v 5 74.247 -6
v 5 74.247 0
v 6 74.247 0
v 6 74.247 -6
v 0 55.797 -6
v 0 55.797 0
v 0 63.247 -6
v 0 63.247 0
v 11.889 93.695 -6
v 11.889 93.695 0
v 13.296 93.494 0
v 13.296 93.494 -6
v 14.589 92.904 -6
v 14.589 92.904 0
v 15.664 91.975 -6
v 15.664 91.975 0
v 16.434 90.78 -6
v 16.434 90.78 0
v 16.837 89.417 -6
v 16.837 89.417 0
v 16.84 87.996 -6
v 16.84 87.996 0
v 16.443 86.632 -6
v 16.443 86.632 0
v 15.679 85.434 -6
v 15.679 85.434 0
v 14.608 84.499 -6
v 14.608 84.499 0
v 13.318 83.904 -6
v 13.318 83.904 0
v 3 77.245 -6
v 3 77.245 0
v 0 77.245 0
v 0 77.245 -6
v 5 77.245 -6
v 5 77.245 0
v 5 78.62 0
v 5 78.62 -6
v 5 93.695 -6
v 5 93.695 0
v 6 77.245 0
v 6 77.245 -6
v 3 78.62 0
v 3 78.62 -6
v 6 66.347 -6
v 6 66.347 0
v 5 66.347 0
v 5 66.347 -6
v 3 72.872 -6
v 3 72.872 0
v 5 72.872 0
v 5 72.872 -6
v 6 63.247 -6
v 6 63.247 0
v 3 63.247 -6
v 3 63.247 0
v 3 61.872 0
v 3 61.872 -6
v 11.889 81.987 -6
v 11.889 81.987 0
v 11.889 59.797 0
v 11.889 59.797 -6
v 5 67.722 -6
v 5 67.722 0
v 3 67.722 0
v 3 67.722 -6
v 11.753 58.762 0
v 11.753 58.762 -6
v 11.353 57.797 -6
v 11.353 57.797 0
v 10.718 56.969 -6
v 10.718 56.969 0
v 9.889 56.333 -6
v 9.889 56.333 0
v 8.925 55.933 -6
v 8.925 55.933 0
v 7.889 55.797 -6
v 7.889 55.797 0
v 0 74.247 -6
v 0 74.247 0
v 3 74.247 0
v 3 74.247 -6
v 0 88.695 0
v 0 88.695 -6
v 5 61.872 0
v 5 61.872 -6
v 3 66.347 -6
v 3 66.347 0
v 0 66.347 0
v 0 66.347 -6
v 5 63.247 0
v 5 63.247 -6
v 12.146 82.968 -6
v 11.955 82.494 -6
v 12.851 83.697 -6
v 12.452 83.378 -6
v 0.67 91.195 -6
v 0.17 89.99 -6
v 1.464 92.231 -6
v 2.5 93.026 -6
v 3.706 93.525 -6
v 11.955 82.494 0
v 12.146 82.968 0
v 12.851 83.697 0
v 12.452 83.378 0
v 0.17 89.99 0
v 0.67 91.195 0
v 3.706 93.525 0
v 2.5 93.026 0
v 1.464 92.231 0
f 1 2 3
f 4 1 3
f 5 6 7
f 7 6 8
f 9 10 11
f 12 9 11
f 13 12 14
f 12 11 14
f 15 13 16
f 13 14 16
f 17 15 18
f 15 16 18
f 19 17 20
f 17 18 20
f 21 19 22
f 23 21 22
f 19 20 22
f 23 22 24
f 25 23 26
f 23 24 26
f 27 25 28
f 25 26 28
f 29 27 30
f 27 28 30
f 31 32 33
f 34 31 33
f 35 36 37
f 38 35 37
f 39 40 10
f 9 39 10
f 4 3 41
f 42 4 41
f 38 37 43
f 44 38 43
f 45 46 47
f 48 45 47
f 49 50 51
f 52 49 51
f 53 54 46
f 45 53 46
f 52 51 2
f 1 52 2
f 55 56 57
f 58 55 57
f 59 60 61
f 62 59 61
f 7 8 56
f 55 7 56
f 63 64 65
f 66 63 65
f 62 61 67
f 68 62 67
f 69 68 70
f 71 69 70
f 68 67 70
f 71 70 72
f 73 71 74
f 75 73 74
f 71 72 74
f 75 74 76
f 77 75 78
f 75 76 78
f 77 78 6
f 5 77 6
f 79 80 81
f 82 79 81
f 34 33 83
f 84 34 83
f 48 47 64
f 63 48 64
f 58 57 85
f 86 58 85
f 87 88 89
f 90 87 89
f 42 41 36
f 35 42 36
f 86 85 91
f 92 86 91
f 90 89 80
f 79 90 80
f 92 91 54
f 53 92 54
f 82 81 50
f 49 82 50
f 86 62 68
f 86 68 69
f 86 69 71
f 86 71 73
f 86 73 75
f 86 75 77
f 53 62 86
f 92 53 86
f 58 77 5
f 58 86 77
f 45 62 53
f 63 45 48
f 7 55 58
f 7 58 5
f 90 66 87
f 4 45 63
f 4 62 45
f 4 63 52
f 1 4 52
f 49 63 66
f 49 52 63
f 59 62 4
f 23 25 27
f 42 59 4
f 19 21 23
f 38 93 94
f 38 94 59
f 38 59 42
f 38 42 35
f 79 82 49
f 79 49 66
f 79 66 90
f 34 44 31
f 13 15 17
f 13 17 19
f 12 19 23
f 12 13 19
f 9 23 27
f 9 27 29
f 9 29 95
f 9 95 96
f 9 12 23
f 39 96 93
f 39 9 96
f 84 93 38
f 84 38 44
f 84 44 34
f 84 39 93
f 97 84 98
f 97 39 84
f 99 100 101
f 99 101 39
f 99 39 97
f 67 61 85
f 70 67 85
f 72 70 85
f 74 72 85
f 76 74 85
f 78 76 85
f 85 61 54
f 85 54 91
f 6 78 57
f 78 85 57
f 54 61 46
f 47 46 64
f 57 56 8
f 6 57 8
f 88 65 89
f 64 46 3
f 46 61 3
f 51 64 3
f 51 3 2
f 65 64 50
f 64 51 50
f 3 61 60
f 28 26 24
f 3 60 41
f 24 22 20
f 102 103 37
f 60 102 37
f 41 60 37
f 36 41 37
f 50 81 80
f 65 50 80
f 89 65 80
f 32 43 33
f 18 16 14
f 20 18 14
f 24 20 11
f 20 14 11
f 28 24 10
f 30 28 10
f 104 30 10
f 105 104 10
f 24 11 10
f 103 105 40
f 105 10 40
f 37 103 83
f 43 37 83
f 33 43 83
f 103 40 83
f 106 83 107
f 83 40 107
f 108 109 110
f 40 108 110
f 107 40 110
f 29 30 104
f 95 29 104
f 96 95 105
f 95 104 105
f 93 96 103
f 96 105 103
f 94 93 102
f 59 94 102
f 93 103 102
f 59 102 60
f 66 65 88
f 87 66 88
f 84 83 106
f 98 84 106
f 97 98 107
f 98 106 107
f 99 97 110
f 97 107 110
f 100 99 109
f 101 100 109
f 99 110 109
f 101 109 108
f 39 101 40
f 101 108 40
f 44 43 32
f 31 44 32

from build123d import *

# Parameters (mm, degrees)
DODANIE_WYCI_GNI_CIE1_DEPTH = 6


with BuildPart() as part:
    # Szkic2 → Dodanie-wyciągnięcie1 (new body)
    with BuildSketch(Plane.XY):
        with BuildLine():
            Line((5, 93.695492388), (11.889307623, 93.695492388))
            ThreePointArc((11.889307623, 93.695492388), (16.836926807, 89.417340299), (13.317879052, 83.903918151))
            ThreePointArc((13.317879052, 83.903918151), (12.285740172, 83.182517065), (11.889307623, 81.987288456))
            Line((11.889307623, 81.987288456), (11.889307623, 59.797095598))
            ThreePointArc((11.889307623, 59.797095598), (10.717734748, 56.968668473), (7.889307623, 55.797095598))
            Line((7.889307623, 55.797095598), (0, 55.797095598))
            Line((0, 55.797095598), (0, 63.247095598))
            Line((0, 63.247095598), (3, 63.247095598))
            Line((3, 63.247095598), (3, 61.872095598))
            Line((3, 61.872095598), (5, 61.872095598))
            Line((5, 61.872095598), (5, 63.247095598))
            Line((5, 63.247095598), (6, 63.247095598))
            Line((6, 63.247095598), (6, 66.347095598))
            Line((6, 66.347095598), (5, 66.347095598))
            Line((5, 66.347095598), (5, 67.722095598))
            Line((5, 67.722095598), (3, 67.722095598))
            Line((3, 67.722095598), (3, 66.347095598))
            Line((3, 66.347095598), (0, 66.347095598))
            Line((0, 66.347095598), (0, 74.247095598))
            Line((0, 74.247095598), (3, 74.247095598))
            Line((3, 74.247095598), (3, 72.872095598))
            Line((3, 72.872095598), (5, 72.872095598))
            Line((5, 72.872095598), (5, 74.247095598))
            Line((5, 74.247095598), (6, 74.247095598))
            Line((6, 74.247095598), (6, 77.245492388))
            Line((6, 77.245492388), (5, 77.245492388))
            Line((5, 77.245492388), (5, 78.620492388))
            Line((5, 78.620492388), (3, 78.620492388))
            Line((3, 78.620492388), (3, 77.245492388))
            Line((3, 77.245492388), (0, 77.245492388))
            Line((0, 77.245492388), (0, 88.695492388))
            ThreePointArc((0, 88.695492388), (1.464466094, 92.231026294), (5, 93.695492388))
        make_face()
    extrude(amount=-DODANIE_WYCI_GNI_CIE1_DEPTH)


solid = part.part
